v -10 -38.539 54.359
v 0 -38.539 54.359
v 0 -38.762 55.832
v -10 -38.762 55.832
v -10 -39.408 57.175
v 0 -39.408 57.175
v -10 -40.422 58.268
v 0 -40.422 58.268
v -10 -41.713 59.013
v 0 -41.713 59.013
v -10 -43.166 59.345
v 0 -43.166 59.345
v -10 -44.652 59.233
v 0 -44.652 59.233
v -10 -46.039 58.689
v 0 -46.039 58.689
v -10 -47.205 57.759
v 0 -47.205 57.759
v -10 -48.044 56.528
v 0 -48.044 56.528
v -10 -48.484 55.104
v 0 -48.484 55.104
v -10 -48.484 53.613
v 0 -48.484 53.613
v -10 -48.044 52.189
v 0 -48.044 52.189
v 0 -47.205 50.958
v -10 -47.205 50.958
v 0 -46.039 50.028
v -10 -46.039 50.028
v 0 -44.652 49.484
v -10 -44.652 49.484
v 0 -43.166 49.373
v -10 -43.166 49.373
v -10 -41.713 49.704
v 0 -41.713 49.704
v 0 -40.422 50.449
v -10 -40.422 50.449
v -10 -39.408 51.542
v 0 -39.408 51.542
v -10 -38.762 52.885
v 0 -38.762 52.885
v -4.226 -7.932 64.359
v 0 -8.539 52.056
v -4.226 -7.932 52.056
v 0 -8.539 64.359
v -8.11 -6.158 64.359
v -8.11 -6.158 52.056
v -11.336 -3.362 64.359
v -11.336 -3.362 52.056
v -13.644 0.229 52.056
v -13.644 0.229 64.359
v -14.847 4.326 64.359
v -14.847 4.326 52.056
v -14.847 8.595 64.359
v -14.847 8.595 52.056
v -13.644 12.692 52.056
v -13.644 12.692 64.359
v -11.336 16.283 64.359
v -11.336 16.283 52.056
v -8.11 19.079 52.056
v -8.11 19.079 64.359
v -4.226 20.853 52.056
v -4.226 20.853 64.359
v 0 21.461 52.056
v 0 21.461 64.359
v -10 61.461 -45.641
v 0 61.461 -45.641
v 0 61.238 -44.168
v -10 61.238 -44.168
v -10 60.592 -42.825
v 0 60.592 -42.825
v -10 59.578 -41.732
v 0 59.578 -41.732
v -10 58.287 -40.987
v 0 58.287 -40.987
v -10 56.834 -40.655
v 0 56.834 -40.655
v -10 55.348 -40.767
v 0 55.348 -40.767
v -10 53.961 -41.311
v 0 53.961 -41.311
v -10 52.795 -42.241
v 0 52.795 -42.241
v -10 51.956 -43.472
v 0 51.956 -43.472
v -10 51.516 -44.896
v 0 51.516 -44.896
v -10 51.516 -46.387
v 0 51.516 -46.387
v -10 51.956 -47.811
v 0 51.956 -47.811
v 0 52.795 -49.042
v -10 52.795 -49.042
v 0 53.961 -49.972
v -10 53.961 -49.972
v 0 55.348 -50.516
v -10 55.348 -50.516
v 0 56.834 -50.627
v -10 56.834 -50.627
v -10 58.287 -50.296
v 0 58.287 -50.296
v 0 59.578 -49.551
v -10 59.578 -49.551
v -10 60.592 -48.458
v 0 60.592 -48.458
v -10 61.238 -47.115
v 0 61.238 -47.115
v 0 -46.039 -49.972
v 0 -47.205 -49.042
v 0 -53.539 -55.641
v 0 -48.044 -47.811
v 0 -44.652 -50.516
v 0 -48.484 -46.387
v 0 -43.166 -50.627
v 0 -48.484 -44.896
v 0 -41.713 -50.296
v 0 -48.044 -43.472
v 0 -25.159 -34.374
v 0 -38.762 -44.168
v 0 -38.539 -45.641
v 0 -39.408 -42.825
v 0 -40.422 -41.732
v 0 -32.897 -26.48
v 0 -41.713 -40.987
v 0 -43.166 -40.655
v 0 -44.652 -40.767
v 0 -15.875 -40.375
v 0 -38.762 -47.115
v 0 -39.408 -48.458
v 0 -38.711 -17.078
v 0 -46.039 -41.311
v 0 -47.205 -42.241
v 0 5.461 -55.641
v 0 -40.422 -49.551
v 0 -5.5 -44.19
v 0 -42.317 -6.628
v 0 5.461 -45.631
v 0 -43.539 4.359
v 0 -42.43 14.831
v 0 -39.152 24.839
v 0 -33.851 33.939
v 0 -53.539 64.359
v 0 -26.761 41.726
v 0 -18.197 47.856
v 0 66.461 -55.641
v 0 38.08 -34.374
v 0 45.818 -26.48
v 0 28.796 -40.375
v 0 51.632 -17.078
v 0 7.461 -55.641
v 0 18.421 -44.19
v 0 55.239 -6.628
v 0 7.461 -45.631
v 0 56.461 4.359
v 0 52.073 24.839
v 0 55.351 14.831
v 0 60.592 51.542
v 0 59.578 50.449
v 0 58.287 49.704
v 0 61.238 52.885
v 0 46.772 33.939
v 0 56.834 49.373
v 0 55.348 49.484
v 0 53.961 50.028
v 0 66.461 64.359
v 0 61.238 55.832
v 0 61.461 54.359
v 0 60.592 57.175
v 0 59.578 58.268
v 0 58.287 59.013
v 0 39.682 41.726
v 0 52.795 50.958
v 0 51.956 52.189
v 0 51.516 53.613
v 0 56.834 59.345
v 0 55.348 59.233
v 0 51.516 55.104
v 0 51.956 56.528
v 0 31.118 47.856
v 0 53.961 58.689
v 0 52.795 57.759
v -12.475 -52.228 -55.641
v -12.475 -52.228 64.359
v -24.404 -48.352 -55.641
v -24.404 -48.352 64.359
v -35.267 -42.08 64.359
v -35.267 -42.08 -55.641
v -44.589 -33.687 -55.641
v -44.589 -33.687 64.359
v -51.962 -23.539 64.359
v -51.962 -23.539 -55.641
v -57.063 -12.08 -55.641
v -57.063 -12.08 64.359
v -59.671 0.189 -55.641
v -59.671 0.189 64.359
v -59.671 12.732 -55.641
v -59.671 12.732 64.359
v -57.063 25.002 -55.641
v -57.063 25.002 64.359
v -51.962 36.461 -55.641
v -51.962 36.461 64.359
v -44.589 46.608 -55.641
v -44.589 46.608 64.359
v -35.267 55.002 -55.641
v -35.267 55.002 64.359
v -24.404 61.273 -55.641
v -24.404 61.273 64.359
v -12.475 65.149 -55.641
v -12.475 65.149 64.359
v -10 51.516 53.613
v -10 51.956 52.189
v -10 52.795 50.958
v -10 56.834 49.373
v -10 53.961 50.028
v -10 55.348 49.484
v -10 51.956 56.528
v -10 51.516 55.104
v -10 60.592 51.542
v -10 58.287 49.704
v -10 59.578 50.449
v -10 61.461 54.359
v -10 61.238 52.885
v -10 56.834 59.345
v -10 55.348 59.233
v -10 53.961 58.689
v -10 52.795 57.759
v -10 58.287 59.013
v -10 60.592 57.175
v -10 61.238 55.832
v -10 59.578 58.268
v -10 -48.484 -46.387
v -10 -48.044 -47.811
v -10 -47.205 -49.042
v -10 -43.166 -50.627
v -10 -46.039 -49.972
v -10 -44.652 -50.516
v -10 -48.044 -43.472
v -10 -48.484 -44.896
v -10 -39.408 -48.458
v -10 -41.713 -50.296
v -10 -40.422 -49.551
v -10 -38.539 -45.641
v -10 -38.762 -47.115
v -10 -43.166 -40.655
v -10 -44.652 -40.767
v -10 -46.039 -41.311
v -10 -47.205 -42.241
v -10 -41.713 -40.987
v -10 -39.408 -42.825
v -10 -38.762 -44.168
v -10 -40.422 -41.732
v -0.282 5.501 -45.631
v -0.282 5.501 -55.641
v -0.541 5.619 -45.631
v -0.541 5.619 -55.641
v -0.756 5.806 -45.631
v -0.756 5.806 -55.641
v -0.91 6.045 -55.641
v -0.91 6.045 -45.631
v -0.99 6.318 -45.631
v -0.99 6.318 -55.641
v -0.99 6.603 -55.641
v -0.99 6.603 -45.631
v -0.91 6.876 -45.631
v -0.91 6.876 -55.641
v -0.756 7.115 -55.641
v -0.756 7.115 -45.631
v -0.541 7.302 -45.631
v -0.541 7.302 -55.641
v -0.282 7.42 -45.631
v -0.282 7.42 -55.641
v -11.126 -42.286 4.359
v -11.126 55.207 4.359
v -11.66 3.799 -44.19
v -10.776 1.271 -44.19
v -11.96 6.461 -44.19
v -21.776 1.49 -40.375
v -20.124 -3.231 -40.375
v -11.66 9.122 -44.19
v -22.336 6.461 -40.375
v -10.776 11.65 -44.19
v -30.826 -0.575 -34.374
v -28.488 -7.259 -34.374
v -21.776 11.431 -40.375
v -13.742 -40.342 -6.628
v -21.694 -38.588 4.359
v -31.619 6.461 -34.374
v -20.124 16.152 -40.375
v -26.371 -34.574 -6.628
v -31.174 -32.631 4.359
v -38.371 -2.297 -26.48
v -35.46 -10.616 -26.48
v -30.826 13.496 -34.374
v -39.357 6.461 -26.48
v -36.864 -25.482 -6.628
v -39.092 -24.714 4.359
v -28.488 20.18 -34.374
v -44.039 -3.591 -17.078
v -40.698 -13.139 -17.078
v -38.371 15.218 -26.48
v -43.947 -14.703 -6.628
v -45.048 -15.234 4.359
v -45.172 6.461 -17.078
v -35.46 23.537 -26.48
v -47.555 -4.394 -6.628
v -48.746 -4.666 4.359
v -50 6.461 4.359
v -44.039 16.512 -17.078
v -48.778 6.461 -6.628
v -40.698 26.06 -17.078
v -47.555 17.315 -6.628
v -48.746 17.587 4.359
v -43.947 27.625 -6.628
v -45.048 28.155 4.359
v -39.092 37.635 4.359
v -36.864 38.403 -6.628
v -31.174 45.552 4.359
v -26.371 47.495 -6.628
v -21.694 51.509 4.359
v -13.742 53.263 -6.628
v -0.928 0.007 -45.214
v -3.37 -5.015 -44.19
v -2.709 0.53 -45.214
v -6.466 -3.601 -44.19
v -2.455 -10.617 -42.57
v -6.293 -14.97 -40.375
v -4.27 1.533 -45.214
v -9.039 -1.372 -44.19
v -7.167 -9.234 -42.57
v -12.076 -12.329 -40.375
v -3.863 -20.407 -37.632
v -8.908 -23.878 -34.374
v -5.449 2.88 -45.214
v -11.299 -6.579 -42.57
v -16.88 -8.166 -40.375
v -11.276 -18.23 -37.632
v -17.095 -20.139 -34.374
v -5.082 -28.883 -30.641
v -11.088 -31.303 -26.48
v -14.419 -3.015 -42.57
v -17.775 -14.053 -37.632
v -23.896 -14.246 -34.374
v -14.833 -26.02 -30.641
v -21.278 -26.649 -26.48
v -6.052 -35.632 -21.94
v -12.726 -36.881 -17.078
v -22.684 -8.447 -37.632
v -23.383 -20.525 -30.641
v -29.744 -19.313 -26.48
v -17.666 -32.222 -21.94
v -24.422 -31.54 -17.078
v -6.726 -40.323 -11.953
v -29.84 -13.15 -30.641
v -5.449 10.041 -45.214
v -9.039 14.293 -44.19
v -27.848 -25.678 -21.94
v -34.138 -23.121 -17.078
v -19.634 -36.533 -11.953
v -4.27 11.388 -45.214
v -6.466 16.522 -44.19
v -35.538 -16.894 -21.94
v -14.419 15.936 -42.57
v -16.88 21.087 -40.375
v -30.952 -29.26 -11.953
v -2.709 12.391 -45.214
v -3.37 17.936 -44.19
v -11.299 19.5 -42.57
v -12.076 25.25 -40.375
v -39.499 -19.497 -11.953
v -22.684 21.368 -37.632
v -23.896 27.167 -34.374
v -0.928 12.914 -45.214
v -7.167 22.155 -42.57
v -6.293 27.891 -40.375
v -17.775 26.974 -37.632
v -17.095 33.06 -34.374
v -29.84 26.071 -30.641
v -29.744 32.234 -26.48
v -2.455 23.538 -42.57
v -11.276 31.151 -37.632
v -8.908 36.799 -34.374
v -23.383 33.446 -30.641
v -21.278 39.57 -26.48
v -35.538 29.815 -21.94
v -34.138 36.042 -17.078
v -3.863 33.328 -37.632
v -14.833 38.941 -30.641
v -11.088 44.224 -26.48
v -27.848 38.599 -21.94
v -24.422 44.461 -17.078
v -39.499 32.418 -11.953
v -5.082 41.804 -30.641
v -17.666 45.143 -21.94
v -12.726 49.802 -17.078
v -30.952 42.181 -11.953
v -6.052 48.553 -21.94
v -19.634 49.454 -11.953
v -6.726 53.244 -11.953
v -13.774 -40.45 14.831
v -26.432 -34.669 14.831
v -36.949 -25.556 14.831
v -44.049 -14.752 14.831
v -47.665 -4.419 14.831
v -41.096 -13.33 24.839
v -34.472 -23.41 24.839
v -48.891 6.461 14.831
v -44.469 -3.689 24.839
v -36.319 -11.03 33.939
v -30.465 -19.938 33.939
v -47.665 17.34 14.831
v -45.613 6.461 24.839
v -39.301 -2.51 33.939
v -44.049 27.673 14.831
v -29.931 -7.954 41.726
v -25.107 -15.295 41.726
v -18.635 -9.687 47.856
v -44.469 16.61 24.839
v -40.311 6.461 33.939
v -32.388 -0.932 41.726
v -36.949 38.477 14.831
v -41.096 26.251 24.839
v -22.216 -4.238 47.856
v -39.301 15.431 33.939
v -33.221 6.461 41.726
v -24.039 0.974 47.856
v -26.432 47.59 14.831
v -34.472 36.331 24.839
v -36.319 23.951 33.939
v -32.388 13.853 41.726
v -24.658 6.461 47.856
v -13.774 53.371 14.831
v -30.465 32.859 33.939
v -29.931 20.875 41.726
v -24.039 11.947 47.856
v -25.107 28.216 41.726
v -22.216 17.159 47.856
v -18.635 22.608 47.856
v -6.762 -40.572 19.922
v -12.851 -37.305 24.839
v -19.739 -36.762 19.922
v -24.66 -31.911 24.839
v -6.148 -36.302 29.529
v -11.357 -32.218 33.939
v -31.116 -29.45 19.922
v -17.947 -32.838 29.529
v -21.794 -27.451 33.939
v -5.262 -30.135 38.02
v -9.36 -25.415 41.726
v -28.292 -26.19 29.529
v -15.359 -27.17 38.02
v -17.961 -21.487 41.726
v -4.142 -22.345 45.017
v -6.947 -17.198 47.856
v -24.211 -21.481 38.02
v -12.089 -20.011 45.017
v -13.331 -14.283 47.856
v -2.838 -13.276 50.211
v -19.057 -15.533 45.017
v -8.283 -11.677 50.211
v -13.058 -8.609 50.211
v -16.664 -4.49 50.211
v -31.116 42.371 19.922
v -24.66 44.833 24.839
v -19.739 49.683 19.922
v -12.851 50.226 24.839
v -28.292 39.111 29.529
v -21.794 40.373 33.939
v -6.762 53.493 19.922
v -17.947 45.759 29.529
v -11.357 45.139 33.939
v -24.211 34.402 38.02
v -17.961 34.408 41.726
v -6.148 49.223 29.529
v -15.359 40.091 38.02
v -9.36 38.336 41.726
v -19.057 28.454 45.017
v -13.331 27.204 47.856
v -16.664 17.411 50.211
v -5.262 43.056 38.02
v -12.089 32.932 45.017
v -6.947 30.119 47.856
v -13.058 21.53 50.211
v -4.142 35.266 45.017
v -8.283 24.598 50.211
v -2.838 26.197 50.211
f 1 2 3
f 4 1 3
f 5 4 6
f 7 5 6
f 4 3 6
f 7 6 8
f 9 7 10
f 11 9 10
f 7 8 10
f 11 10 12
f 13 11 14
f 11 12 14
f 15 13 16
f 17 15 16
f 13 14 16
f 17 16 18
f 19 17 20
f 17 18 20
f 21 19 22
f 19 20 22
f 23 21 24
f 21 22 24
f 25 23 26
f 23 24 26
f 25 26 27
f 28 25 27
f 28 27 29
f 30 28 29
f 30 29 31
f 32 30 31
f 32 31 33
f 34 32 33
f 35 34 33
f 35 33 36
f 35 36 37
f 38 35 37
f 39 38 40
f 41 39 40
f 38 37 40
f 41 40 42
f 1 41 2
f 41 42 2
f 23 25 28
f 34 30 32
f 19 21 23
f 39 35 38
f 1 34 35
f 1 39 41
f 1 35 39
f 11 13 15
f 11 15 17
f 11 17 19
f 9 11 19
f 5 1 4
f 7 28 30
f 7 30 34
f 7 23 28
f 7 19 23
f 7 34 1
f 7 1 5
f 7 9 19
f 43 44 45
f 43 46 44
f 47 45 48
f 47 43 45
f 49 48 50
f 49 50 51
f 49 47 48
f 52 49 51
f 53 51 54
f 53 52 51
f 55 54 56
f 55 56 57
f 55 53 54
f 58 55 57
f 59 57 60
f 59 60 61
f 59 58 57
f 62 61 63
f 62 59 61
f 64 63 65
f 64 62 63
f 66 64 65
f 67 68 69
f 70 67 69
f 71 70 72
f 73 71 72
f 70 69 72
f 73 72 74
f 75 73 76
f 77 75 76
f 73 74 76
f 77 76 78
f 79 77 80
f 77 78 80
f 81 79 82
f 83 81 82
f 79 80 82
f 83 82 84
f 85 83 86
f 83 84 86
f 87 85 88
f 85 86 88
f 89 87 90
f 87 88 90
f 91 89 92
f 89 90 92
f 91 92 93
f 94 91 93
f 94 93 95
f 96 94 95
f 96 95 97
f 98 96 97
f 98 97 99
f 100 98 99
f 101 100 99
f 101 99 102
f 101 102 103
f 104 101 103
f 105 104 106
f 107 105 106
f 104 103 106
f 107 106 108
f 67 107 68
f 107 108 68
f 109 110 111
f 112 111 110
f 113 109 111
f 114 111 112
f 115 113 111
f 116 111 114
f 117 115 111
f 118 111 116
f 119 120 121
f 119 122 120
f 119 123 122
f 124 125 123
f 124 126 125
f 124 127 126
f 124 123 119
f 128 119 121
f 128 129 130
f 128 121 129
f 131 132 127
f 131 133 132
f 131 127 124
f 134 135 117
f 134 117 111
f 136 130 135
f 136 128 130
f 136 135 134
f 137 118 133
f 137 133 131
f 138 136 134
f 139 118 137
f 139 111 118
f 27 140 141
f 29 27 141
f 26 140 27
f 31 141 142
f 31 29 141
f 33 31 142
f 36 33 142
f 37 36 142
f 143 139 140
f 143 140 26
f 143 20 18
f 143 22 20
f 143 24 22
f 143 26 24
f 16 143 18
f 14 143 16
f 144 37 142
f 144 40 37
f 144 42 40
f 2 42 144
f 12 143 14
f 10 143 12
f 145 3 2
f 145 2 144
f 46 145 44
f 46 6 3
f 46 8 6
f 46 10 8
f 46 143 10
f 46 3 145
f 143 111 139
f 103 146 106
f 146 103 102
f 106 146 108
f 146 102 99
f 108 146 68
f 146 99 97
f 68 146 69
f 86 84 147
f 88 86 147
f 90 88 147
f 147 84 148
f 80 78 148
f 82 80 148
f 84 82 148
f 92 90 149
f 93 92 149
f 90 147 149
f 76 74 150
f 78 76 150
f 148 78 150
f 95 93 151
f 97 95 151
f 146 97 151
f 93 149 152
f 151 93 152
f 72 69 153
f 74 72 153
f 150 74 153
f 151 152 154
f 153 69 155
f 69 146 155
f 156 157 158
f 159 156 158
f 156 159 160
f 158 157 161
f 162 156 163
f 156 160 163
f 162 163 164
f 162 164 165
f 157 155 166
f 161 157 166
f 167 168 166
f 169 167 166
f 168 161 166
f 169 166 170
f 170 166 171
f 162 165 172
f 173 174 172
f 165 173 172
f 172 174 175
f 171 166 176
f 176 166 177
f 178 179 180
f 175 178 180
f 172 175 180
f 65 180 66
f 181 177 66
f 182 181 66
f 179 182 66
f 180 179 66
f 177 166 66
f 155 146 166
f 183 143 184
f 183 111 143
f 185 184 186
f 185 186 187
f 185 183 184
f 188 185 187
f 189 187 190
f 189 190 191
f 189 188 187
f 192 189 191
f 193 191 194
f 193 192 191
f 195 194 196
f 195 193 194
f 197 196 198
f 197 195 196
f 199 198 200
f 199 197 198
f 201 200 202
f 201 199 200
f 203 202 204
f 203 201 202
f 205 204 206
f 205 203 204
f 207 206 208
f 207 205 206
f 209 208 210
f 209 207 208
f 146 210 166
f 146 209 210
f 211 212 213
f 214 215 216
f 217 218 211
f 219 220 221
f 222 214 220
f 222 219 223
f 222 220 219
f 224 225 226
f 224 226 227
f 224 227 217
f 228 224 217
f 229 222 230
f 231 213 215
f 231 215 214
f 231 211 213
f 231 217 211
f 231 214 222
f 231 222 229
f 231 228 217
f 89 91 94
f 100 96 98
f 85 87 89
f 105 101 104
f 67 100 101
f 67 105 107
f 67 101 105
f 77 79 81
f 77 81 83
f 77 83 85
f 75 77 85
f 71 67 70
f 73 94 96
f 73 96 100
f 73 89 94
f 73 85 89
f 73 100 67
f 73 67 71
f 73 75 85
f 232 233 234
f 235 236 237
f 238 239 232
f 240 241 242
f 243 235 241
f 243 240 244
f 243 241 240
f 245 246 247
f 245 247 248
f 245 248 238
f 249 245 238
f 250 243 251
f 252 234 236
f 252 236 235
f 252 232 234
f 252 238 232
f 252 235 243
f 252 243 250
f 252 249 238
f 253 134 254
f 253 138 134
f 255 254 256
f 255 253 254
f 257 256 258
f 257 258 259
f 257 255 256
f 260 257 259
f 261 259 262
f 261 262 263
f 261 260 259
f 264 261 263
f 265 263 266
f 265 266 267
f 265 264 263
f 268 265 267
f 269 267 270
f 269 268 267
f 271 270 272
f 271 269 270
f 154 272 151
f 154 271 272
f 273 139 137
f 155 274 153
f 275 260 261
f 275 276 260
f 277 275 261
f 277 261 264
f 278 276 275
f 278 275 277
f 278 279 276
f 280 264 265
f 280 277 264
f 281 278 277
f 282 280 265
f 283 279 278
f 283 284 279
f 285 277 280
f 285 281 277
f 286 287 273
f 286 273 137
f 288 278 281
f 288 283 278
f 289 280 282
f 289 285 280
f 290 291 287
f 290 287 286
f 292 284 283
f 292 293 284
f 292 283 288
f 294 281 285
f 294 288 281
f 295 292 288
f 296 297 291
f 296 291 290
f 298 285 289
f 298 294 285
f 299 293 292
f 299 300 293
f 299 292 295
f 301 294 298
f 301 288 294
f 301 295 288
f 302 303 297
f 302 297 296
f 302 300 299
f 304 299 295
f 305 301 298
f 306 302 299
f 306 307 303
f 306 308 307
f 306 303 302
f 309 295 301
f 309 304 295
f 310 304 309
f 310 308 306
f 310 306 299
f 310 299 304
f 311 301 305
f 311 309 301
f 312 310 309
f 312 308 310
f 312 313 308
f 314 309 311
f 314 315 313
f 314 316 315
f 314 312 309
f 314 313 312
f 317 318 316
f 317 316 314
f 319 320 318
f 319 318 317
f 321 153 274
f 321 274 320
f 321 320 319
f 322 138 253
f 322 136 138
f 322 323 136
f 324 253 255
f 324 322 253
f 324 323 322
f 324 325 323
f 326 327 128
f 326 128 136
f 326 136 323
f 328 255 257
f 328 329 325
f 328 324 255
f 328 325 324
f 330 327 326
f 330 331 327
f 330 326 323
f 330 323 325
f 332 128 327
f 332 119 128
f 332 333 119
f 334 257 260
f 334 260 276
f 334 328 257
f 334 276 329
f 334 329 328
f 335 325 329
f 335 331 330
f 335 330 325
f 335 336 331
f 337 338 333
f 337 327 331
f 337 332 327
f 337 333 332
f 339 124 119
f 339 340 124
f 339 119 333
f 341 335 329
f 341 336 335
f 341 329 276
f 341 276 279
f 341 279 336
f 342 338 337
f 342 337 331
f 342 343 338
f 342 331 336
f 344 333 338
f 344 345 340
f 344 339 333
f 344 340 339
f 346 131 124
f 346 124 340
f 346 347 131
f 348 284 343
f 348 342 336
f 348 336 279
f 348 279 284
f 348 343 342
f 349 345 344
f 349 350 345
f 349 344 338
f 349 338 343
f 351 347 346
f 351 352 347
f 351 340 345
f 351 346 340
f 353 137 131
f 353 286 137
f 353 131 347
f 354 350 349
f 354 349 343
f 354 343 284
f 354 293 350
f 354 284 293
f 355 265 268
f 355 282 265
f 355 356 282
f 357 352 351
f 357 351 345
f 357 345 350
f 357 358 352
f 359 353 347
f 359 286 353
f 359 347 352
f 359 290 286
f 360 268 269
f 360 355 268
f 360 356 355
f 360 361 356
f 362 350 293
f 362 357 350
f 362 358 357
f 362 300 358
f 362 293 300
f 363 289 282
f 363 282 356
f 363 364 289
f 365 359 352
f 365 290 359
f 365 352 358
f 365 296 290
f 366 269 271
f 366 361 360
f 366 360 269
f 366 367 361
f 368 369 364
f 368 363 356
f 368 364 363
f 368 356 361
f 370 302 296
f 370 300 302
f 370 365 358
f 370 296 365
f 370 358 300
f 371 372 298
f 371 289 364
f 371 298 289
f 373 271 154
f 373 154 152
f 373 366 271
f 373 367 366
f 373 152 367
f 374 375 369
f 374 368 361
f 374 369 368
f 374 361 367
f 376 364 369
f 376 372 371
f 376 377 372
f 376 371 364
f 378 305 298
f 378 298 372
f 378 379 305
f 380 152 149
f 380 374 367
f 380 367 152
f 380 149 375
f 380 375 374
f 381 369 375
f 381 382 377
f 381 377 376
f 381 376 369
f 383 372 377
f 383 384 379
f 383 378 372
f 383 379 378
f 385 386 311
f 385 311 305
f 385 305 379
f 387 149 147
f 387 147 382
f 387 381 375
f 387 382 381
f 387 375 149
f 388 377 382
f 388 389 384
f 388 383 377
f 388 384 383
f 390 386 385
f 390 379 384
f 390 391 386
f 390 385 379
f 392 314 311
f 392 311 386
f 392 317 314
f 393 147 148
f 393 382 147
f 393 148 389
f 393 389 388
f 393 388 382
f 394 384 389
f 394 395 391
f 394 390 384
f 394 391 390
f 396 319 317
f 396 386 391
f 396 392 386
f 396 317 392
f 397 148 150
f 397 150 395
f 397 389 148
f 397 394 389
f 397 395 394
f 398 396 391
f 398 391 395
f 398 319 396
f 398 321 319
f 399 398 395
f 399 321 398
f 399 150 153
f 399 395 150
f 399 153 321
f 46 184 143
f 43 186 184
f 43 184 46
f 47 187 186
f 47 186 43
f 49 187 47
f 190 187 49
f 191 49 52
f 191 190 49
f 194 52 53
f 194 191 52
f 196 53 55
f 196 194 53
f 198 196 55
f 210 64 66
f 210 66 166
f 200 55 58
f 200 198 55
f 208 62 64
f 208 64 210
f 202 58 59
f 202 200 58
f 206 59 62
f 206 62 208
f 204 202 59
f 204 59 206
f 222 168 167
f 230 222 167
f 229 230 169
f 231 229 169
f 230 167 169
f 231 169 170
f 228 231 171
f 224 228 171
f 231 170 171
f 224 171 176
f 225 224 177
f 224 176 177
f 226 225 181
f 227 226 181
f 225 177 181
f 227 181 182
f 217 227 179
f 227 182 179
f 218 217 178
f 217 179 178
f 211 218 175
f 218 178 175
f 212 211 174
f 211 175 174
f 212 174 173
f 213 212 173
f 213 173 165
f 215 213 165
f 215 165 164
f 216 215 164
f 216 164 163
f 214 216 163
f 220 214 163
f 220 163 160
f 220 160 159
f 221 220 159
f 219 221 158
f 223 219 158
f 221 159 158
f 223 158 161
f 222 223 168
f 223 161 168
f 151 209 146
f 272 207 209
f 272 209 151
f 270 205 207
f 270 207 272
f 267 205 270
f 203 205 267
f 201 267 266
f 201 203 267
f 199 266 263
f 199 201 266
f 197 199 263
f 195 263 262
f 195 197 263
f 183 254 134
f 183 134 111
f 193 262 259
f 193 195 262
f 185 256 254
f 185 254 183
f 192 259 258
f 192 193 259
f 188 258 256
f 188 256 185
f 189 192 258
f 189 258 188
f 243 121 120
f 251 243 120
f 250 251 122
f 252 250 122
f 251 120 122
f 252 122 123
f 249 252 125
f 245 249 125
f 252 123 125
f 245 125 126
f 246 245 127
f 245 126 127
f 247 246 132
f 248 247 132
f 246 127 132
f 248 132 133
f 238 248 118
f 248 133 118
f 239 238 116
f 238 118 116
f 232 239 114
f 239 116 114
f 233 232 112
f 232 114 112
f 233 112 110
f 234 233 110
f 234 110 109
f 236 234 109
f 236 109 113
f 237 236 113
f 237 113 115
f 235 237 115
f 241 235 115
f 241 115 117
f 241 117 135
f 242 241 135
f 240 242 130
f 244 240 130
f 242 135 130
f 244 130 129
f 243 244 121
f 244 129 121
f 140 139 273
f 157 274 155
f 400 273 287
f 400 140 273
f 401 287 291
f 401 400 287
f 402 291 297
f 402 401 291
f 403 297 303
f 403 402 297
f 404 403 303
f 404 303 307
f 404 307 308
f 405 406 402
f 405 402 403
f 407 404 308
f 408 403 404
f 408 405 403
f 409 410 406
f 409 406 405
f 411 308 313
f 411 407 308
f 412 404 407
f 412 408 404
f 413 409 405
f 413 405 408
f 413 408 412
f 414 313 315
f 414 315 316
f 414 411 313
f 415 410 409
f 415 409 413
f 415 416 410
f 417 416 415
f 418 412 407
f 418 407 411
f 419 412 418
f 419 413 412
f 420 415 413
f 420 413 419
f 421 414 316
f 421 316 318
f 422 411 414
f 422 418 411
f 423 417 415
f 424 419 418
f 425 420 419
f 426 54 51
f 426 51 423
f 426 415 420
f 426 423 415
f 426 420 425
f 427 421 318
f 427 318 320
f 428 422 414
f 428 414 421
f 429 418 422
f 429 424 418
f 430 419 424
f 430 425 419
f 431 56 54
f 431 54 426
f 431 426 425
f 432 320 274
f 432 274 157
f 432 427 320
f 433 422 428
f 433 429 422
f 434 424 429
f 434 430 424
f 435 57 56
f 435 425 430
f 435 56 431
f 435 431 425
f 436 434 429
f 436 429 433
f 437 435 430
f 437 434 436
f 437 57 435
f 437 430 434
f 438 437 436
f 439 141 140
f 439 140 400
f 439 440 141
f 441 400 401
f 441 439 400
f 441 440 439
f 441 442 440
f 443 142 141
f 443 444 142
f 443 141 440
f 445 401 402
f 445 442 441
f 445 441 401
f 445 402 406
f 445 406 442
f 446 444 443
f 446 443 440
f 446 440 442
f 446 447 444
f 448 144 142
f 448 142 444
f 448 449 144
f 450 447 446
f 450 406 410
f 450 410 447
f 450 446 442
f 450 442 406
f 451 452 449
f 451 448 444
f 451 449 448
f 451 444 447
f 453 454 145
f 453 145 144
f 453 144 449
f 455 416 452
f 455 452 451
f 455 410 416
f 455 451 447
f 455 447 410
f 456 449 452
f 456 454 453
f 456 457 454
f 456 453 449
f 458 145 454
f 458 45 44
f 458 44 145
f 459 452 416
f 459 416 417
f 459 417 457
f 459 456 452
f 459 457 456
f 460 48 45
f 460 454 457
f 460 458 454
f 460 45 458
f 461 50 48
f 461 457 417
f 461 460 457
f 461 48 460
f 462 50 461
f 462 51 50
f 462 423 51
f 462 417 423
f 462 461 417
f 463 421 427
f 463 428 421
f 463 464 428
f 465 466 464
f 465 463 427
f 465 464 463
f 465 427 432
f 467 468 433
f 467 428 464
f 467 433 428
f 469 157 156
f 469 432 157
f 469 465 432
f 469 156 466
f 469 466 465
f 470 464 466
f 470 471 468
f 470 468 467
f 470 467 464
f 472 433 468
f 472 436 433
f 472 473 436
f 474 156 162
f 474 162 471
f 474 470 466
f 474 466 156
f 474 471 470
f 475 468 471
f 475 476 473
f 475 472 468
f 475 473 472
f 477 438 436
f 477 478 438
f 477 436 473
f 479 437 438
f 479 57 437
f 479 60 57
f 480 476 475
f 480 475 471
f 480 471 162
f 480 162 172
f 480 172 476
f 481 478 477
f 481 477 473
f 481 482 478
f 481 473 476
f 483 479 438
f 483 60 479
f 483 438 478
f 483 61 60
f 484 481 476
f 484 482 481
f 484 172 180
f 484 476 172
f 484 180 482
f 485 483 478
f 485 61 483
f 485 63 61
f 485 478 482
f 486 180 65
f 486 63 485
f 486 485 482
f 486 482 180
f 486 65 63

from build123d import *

# Parameters (mm, degrees)
F0_R     = 5
F1_ANGLE = -180
F2_DEPTH = 10


with BuildPart() as f1:
    # F0 (on Right) → F1 (revolve)
    with BuildSketch(Plane.YZ):
        with BuildLine():
            Line((-8.539474, 54.358603), (-8.539474, 64.358603))
            Line((-8.539474, 64.358603), (-53.539474, 64.358603))
            Line((-53.539474, 64.358603), (-53.539474, -55.641397))
            Line((-53.539474, -55.641397), (5.460526, -55.641397))
            Line((5.460526, -55.641397), (5.460526, -45.641397))
            Line((5.460526, -45.641397), (5.460526, -45.631396))
            ThreePointArc((5.460526, -45.631396), (-29.246616, -30.641397), (-43.539474, 4.358603))
            ThreePointArc((-43.539474, 4.358603), (-33.850762, 33.939002), (-8.539474, 52.055563))
            Line((-8.539474, 52.055563), (-8.539474, 54.358603))
        make_face()
        with Locations((-43.539474, -45.641397)):
            Circle(F0_R, mode=Mode.SUBTRACT)
        with Locations((-43.539474, 54.358603)):
            Circle(F0_R, mode=Mode.SUBTRACT)
        with Locations((-43.539474, 54.358603)):
            Circle(F0_R)
        with Locations((-43.539474, -45.641397)):
            Circle(F0_R)
    revolve(axis=Axis((0, 6.460526, 9.358603), (0, 0, 1)), revolution_arc=F1_ANGLE)

    # F0 (on Right) → F2 (cut)
    with BuildSketch(Plane.YZ):
        with Locations((-43.539474, 54.358603)):
            Circle(F0_R)
        with Locations((56.460526, 54.358603)):
            Circle(F0_R)
        with Locations((-43.539474, -45.641397)):
            Circle(F0_R)
        with Locations((56.460526, -45.641397)):
            Circle(F0_R)
    extrude(amount=-F2_DEPTH, mode=Mode.SUBTRACT)


solid = f1.part
